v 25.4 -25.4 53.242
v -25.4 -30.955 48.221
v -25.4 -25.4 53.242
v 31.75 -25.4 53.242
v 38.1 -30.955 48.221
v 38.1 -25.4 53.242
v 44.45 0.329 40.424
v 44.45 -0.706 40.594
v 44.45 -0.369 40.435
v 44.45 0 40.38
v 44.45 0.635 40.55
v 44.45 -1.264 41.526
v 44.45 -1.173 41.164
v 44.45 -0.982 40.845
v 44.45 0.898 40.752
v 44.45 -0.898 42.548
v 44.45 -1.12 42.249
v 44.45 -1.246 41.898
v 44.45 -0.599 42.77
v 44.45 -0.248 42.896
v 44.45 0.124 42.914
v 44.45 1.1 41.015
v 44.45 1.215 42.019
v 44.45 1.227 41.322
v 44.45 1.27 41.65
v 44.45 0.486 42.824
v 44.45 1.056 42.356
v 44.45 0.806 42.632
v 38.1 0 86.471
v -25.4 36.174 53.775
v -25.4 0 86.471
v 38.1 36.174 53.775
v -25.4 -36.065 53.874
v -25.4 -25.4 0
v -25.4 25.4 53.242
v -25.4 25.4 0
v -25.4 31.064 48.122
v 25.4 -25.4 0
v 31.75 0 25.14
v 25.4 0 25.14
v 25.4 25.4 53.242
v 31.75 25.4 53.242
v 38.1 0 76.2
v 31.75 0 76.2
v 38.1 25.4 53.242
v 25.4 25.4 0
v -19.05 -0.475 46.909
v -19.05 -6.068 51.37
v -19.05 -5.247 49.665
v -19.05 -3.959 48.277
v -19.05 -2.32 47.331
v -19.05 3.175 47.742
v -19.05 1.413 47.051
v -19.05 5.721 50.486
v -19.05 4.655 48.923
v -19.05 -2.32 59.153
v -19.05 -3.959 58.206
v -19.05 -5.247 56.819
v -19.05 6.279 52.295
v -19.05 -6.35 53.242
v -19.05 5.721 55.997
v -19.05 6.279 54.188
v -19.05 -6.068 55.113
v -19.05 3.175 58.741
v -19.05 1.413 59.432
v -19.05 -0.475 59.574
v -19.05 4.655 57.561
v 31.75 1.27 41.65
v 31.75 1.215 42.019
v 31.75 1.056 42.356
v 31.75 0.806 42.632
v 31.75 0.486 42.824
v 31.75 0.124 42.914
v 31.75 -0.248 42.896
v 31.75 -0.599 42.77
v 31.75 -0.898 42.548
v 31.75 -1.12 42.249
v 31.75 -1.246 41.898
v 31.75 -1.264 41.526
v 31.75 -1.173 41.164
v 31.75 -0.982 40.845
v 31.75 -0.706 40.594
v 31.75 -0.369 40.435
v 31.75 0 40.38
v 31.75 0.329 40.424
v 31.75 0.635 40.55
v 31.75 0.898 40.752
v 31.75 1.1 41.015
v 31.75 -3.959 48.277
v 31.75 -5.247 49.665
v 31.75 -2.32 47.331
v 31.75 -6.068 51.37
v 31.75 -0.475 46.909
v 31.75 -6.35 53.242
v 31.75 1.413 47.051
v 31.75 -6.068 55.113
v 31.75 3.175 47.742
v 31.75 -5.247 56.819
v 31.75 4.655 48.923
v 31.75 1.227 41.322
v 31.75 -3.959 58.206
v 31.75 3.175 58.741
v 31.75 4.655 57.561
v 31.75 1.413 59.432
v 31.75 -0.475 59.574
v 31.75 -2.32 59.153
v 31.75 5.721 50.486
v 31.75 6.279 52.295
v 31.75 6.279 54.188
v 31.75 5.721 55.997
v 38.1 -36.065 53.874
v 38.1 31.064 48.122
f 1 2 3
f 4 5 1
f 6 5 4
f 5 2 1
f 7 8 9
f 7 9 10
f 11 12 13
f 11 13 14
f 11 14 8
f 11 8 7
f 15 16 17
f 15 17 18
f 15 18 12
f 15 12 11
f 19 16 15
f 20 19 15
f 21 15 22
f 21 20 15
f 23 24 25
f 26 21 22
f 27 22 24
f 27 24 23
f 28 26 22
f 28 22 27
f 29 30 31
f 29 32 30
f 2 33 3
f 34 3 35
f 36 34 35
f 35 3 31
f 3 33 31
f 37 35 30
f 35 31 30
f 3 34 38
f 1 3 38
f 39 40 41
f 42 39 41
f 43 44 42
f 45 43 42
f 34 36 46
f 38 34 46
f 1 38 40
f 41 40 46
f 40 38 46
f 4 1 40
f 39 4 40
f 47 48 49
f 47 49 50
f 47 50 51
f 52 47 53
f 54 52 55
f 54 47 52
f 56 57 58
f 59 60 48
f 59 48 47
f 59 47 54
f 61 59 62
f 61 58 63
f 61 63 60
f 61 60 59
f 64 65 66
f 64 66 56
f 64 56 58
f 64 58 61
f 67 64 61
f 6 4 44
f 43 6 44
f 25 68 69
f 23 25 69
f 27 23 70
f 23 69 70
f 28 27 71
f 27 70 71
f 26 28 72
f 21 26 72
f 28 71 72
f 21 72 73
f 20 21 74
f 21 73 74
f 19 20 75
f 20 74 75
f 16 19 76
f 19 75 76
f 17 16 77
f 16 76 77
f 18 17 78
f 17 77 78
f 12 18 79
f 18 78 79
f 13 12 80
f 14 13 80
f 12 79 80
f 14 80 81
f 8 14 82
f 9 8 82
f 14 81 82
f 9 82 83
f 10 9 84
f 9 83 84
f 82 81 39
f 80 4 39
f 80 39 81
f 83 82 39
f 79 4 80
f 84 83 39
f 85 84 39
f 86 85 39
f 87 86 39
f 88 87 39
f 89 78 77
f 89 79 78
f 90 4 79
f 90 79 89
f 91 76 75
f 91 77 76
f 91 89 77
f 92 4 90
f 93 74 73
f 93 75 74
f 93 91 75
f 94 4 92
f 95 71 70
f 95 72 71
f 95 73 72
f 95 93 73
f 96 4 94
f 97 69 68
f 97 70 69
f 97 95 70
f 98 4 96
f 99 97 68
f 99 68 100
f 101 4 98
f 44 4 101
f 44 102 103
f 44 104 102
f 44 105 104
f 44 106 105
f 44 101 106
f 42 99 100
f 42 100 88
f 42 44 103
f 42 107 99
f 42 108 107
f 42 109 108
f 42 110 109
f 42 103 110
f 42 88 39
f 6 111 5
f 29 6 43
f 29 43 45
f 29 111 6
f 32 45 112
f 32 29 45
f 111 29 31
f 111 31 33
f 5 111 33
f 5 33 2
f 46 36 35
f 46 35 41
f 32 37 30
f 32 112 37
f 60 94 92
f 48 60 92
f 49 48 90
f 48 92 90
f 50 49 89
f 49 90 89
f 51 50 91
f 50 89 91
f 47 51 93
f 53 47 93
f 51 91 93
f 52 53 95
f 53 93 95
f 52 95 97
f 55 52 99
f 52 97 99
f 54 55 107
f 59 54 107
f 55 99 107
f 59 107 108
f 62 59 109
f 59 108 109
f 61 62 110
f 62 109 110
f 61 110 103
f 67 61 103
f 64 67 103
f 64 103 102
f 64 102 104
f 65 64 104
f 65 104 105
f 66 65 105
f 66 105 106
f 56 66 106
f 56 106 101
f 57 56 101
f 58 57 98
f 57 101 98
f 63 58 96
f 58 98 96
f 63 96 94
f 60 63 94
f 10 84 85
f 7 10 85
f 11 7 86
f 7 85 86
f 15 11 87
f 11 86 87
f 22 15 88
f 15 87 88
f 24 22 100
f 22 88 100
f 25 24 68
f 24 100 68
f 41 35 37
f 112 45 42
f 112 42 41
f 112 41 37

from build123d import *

# Parameters (mm, degrees)
F0_W      = 50.8
F0_H      = 50.8
F1_DEPTH  = 63.5
F3_DEPTH  = 12.7
F5_DEPTH  = 6.35
F6_DEPTH  = 50.8
F8_DEPTH  = 50.8
F10_DEPTH = 12.7


with BuildPart() as f1:
    # F0 (on Top) → F1 (new body)
    with BuildSketch(Plane.XY):
        Rectangle(F0_W, F0_H)
    extrude(amount=F1_DEPTH)

    # F2 (on face) → F3 (join)
    with BuildSketch(Plane.YZ.offset(25.4)):
        Polygon((-14.0506572952, 63.5), (0, 76.2), (0, 86.4714240594), (-36.0647195239, 53.8735228844), (-30.9551258806, 48.2205190104), (-25.4, 53.2416434461), (-25.4, 63.5), align=None)
        Polygon((-25.4, 53.2416434461), (-14.0506572952, 63.5), (-25.4, 63.5), align=None)
        Polygon((0, 86.4714240594), (0, 76.2), (14.0506572952, 63.5), (25.4, 63.5), (25.4, 53.2416434461), (31.0640838699, 48.1220349014), (36.1736775133, 53.7750387754), align=None)
        Polygon((25.4, 63.5), (14.0506572952, 63.5), (25.4, 53.2416434461), align=None)
    extrude(amount=F3_DEPTH)

    # F4 (on face) → F5 (join)
    with BuildSketch(Plane.YZ.offset(25.4)):
        Polygon((-14.0506572952, 63.5), (-25.4, 53.2416434461), (0, 25.1403288557), (25.4, 53.2416434461), (14.0506572952, 63.5), align=None)
        Polygon((0, 76.2), (-14.0506572952, 63.5), (14.0506572952, 63.5), align=None)
    extrude(amount=F5_DEPTH)

    # F6 (add): faces of the model
    f6_faces = [f1.faces().sort_by_distance(p)[0] for p in [
        (25.4, 0.0499832571, 67.5742219927),
        (25.4, 0.0499832571, 67.5742219927),
        (25.4, 0.0499832571, 67.5742219927),
    ]]
    extrude(f6_faces, amount=F6_DEPTH)

    # F7 (on face) → F8 (cut)
    with BuildSketch(Plane.YZ.offset(31.75)):
        with BuildLine():
            Line((-6.35, 53.2416434461), (6.35, 53.2416434461))
            ThreePointArc((6.35, 53.2416434461), (0, 59.5916434461), (-6.35, 53.2416434461))
        make_face()
        with BuildLine():
            ThreePointArc((-6.35, 53.2416434461), (0, 46.8916434461), (6.35, 53.2416434461))
            Line((6.35, 53.2416434461), (-6.35, 53.2416434461))
        make_face()
    extrude(amount=-F8_DEPTH, mode=Mode.SUBTRACT)

    # F9 (on face) → F10 (join)
    with BuildSketch(Plane.YZ.offset(31.75)):
        with BuildLine():
            ThreePointArc((1.27, 41.6503288557), (-0.8980256121, 42.5483544678), (0, 40.3803288557))
            ThreePointArc((0, 40.3803288557), (0.8980256121, 40.7523032436), (1.27, 41.6503288557))
        make_face()
    extrude(amount=F10_DEPTH)


solid = f1.part
